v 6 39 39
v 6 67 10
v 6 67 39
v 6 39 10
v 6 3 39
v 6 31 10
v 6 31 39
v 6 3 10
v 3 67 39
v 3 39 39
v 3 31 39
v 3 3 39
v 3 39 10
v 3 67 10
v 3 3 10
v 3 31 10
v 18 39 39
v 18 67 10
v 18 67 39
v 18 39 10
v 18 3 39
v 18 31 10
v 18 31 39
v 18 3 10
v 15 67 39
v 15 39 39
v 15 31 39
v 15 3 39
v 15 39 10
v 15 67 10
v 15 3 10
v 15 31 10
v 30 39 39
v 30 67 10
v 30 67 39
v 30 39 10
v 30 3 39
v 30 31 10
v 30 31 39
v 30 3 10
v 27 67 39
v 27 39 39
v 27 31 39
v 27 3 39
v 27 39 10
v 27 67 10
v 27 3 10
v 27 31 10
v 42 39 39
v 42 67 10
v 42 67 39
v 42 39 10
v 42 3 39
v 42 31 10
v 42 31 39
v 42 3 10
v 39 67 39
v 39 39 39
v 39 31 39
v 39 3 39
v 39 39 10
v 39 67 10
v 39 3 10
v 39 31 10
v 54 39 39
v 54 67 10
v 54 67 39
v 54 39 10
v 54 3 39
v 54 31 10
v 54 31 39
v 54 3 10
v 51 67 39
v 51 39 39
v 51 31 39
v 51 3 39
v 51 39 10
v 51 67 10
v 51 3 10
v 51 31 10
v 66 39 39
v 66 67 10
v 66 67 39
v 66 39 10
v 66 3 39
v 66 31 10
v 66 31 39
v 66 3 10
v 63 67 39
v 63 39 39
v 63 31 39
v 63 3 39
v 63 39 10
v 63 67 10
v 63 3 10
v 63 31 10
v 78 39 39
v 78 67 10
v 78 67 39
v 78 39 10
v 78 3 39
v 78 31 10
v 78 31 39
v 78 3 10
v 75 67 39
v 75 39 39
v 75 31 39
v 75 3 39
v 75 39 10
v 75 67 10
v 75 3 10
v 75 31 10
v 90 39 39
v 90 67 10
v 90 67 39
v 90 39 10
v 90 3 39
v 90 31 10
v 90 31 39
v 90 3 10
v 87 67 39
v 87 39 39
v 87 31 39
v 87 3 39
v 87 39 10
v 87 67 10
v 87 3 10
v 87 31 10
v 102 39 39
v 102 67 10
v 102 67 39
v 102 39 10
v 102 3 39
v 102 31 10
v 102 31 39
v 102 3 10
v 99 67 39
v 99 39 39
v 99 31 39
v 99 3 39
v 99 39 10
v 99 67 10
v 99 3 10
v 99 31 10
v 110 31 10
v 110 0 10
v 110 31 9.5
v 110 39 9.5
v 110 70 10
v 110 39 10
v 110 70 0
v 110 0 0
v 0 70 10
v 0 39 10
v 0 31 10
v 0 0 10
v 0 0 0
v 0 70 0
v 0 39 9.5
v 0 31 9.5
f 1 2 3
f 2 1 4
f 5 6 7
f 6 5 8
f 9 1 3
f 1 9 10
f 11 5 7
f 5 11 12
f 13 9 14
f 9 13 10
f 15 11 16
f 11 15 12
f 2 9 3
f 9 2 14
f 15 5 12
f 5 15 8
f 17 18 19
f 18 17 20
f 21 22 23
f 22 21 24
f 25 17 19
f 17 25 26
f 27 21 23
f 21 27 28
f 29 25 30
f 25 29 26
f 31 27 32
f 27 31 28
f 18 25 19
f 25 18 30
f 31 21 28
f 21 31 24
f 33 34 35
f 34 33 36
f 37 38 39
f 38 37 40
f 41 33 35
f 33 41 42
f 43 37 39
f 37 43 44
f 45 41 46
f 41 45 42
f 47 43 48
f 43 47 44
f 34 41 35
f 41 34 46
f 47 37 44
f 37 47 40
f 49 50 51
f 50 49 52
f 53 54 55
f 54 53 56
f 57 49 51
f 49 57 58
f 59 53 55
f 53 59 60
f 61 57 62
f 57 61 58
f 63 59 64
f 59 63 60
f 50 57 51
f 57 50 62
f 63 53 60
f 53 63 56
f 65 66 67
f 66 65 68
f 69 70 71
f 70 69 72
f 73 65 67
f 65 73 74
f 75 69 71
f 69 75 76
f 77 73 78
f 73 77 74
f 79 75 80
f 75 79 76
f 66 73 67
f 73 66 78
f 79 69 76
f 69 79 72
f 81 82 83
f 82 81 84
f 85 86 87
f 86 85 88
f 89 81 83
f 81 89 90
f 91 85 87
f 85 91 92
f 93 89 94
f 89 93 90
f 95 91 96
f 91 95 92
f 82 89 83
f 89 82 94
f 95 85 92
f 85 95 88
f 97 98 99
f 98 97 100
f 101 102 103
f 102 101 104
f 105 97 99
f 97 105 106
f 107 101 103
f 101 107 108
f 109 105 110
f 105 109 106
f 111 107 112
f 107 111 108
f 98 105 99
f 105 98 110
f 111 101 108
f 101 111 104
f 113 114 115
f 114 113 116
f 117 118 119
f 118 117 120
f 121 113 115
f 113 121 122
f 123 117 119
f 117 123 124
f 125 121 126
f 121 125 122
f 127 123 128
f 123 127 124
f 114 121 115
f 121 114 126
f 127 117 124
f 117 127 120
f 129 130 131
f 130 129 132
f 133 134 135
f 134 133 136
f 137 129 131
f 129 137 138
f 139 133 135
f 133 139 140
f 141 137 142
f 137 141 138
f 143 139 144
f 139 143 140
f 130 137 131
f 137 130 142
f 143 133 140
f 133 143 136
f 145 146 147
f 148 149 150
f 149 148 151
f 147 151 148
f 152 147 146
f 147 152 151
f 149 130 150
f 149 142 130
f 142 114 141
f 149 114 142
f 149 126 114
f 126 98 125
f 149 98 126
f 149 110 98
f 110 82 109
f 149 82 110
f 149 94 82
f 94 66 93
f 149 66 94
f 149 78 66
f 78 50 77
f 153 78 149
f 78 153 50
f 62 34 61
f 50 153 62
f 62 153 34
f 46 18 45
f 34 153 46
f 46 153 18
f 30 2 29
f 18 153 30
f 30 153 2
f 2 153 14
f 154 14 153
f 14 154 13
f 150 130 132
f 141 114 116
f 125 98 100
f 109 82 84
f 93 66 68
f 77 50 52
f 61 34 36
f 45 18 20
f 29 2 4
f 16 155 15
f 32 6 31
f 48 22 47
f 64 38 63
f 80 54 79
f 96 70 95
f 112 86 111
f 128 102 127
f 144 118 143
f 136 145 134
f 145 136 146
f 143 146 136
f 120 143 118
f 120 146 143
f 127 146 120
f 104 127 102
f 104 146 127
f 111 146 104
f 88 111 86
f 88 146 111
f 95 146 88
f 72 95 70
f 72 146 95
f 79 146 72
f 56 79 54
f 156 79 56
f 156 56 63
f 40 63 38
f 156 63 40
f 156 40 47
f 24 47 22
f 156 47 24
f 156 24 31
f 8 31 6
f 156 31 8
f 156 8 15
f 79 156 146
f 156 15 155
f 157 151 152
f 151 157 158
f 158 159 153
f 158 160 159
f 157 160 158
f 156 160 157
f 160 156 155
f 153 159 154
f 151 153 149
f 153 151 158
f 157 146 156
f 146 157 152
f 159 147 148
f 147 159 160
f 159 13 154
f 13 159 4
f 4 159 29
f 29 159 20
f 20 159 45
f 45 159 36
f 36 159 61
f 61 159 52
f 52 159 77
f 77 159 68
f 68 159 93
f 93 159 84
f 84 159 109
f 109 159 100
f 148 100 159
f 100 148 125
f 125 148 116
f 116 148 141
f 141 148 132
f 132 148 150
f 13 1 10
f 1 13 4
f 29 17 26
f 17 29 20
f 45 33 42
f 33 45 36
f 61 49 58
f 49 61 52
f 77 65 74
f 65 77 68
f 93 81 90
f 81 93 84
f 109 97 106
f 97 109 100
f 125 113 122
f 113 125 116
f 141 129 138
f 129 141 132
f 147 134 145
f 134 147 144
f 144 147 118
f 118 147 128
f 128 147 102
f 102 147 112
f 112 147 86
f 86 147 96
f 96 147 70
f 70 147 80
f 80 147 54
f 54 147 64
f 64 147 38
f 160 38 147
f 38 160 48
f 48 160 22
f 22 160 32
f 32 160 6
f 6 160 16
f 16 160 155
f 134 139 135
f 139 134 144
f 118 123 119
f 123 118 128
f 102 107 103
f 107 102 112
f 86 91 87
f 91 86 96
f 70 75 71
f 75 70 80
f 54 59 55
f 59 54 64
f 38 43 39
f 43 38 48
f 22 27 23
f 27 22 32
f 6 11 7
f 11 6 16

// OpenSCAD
$fn = 32;

// ----------------------------------------------------------------------
// Heatsink: slotted fin block
// ----------------------------------------------------------------------

// --- parameters (mm) ---
base_l = 110;             // base length, X
base_w = 70;              // base width, Y
base_t = 10;              // base plate thickness
fin_h = 30;               // fin height above the base
fin_t = 3;                // fin thickness
edge = 3;                 // margin from the base ends
pitch = 12;               // fin pitch
slot_w = 8;               // central slot width, Y

n_fins = floor((base_l - 2 * edge - fin_t) / pitch) + 1;  // fin count
total_h = base_t + fin_h - 1;  // overall height

difference() {
union() {
  cube([base_l, base_w, base_t]);
  for (i = [0 : n_fins - 1])
    translate([edge + i * pitch, edge, base_t - 1])
      cube([fin_t, base_w - 2 * edge, fin_h]);
}
  translate([-1, base_w / 2 - slot_w / 2, base_t - 0.5])
    cube([base_l + 2, slot_w, fin_h + 2]);
}
